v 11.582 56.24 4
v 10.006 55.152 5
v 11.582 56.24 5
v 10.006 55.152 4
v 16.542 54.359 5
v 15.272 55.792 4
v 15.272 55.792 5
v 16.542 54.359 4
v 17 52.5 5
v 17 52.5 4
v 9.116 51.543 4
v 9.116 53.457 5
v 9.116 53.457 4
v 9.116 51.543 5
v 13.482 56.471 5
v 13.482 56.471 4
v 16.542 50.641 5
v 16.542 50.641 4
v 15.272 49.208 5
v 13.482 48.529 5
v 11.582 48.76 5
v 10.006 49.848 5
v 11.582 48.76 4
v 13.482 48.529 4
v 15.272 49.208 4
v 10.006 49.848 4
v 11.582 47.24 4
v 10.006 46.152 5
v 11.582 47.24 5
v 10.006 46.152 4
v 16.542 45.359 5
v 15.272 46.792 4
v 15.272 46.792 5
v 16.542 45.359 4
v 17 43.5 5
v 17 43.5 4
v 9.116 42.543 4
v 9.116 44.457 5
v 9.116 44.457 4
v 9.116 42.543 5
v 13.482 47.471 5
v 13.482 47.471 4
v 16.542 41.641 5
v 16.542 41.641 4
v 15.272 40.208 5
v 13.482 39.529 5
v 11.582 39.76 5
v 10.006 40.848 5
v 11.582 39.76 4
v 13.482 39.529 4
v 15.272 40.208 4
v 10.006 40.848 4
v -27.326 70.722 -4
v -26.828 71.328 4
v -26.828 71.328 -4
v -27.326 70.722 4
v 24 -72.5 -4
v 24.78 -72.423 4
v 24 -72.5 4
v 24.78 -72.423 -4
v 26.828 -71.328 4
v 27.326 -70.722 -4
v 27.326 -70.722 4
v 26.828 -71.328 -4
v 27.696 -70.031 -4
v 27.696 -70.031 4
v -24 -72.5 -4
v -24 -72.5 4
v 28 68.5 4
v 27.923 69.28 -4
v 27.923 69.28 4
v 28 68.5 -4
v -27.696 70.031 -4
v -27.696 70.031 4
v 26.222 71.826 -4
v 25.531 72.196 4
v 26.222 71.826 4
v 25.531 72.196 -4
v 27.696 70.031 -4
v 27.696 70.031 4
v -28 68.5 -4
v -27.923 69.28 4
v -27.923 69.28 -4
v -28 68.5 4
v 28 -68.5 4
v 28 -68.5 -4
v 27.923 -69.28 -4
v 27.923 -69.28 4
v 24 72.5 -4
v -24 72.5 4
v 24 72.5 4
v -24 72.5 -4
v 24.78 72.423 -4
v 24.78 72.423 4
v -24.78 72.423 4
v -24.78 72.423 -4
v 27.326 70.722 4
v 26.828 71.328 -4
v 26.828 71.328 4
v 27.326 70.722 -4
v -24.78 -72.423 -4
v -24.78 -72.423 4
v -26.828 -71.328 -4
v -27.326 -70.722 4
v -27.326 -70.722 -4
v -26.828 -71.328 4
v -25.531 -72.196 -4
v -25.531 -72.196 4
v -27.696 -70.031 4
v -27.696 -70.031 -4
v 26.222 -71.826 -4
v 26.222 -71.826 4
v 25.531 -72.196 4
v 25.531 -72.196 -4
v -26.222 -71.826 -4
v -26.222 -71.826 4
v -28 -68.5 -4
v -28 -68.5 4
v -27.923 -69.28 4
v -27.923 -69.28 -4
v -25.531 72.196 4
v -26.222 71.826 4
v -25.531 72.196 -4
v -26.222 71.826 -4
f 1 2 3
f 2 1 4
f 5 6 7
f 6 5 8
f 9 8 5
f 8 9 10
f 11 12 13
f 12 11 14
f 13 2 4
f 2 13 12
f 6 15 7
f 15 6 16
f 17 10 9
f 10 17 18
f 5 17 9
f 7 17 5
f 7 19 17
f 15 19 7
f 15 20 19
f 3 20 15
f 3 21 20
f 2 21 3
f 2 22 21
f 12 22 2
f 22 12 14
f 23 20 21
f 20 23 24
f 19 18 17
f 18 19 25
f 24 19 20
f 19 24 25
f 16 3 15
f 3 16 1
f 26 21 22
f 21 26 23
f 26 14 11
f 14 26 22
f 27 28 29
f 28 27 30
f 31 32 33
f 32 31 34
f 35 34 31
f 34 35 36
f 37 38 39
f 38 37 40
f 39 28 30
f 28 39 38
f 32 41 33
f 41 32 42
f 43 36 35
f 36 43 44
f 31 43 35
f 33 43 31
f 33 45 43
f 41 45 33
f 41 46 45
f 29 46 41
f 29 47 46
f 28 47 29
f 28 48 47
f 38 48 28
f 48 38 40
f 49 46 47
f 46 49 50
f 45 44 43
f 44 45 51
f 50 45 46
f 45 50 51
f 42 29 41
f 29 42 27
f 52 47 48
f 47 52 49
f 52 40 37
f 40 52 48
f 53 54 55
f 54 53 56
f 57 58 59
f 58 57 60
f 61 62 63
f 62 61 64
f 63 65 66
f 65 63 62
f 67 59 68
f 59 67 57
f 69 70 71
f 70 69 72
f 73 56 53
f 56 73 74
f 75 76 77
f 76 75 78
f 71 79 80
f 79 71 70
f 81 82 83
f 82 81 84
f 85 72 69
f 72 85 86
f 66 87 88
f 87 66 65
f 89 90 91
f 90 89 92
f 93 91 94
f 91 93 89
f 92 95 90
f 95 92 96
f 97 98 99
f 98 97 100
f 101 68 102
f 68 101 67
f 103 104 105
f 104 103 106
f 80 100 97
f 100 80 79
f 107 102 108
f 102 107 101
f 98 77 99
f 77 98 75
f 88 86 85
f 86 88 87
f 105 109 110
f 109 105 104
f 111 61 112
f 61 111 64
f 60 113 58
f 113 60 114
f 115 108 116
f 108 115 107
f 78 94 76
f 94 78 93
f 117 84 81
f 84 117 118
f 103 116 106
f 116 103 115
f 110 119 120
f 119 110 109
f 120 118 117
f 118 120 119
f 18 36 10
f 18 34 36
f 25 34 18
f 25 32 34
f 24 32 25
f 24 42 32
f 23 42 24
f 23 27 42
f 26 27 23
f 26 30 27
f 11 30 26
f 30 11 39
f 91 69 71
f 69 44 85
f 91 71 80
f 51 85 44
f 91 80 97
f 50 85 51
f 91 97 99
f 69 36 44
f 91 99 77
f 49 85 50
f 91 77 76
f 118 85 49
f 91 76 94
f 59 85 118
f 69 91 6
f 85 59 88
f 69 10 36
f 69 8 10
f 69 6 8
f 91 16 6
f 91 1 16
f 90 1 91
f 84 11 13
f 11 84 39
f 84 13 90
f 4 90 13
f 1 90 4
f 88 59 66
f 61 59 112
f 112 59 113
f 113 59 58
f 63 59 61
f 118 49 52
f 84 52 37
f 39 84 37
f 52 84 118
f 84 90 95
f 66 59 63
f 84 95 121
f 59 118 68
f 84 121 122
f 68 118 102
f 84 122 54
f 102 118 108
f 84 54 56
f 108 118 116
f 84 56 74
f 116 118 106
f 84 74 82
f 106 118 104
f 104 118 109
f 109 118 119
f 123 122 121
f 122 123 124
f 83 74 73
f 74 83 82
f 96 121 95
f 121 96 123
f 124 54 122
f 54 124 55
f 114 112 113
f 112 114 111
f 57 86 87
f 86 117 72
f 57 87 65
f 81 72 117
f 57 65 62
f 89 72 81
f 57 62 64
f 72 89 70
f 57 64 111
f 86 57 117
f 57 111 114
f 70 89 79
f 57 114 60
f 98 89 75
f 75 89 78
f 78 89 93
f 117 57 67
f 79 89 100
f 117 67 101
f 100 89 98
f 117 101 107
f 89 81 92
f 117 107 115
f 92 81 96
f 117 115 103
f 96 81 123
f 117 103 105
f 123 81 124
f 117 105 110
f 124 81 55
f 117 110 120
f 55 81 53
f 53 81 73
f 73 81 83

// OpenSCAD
echo("Работа Марата Горбушина!");

len_phone = 145;
width_phone = 56;
thickness_phone = 8;
corner_round = 8;

//color("red")
//translate([0, 0, 10])
//cube([width_phone, len_phone, thickness_phone], center=true);

module smartphone() {
    hull() {
        translate([width_phone/2 - corner_round/2, len_phone/2 - corner_round/2, 0])
        cylinder(h = thickness_phone, d = corner_round, $fn = 32, center = true);

        mirror([1, 0, 0])
        translate([width_phone/2 - corner_round/2, len_phone/2 - corner_round/2, 0])
        cylinder(h = thickness_phone, d = corner_round, $fn = 32, center = true);

        mirror([0, 1, 0])
        translate([width_phone/2 - corner_round/2, len_phone/2 - corner_round/2, 0])
        cylinder(h = thickness_phone, d = corner_round, $fn = 32, center = true);

        mirror([1, 0, 0])
        mirror([0, 1, 0])
        translate([width_phone/2 - corner_round/2, len_phone/2 - corner_round/2, 0])
        cylinder(h = thickness_phone, d = corner_round, $fn = 32, center = true);
    }
}

module cameras_block() {
    color("blue")
    translate([width_phone/2 - 15, len_phone/2 - 20, 0])
    cylinder(d = 8, h = thickness_phone/2 + 1);

    color("blue")
    translate([width_phone/2 - 15, len_phone/2 - 29, 0])
    cylinder(d = 8, h = thickness_phone/2 + 1);
}

smartphone();
cameras_block();
